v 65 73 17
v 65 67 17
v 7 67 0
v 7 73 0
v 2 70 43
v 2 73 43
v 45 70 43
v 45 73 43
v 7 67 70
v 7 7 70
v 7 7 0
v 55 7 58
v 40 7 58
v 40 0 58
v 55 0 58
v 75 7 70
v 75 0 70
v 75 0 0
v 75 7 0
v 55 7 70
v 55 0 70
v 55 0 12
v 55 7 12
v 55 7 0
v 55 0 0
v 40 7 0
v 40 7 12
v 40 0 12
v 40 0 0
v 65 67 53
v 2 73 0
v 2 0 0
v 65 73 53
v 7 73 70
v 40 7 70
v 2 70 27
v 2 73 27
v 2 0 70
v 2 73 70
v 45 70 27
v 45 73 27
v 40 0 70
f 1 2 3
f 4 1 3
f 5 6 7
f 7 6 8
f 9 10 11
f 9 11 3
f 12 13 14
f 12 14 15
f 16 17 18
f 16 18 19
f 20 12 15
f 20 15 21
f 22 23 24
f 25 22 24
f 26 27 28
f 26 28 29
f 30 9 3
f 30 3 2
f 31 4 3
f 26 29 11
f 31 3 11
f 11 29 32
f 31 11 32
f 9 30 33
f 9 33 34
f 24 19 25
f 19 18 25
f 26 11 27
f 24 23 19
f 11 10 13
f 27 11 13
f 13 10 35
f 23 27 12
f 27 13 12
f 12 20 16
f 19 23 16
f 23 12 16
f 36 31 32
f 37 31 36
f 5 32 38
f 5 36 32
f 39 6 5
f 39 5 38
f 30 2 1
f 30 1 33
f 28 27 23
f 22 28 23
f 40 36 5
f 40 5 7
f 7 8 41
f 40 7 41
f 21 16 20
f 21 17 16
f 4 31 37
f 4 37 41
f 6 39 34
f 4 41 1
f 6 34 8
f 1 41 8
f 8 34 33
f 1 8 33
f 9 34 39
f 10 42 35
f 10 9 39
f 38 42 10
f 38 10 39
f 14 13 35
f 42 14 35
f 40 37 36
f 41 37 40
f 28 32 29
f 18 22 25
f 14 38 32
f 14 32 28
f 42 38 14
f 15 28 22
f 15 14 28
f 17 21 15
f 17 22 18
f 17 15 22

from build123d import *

# Parameters (mm, degrees)
SKETCH_1_W          = 7
SKETCH_1_H          = 60
SKETCH_1_W_2        = 75
SKETCH_1_H_2        = 7
EXTRUDE_1_DEPTH     = 35
EXTRUDE_2_DEPTH     = 6
SKETCH_3_W          = 45
SKETCH_3_H          = 8
CUT_EXTRUDE_1_DEPTH = 3
SKETCH_4_W          = 15
SKETCH_4_H          = 12
CUT_EXTRUDE_2_DEPTH = 106.858395983
CUT_EXTRUDE_3_DEPTH = 2


with BuildPart() as part:
    # Эскиз1 → Бобышка-Вытянуть1 (new body)
    with BuildSketch(Plane.XY):
        with Locations((3.5, 37)):
            Rectangle(SKETCH_1_W, SKETCH_1_H)
        with Locations((37.5, 3.5)):
            Rectangle(SKETCH_1_W_2, SKETCH_1_H_2)
    extrude_1 = extrude(amount=EXTRUDE_1_DEPTH)

    # Эскиз2 → Бобышка-Вытянуть2 (add)
    with BuildSketch(Plane(origin=(0, 67, 0), x_dir=(1, 0, 0), z_dir=(0, 1, 0))):
        Polygon((0, -35), (65, -35), (65, -17), (7, 0), (0, 0), align=None)
    extrude_2 = extrude(amount=EXTRUDE_2_DEPTH)

    # Эскиз3 → Вырез-Вытянуть1 (cut)
    with BuildSketch(Plane(origin=(0, 73, 0), x_dir=(1, 0, 0), z_dir=(0, 1, 0))):
        with Locations((22.5, -31)):
            Rectangle(SKETCH_3_W, SKETCH_3_H)
    cut_extrude_1 = extrude(amount=-CUT_EXTRUDE_1_DEPTH, mode=Mode.SUBTRACT)

    # Эскиз4 → Вырез-Вытянуть2 (cut, through all)
    with BuildSketch(Plane(origin=(0, 7, 0), x_dir=(1, 0, 0), z_dir=(0, 1, 0))):
        with Locations((47.5, -6)):
            Rectangle(SKETCH_4_W, SKETCH_4_H)
    cut_extrude_2 = extrude(amount=-CUT_EXTRUDE_2_DEPTH, mode=Mode.SUBTRACT)

    # Зеркальное отражение1: Бобышка-Вытянуть1, Бобышка-Вытянуть2, Вырез-Вытянуть1, Вырез-Вытянуть2 across plane
    add(extrude_1.mirror(Plane.XY.offset(35)))
    add(extrude_2.mirror(Plane.XY.offset(35)))
    add(cut_extrude_1.mirror(Plane.XY.offset(35)), mode=Mode.SUBTRACT)
    add(cut_extrude_2.mirror(Plane.XY.offset(35)), mode=Mode.SUBTRACT)

    # Эскиз5 → Вырез-Вытянуть3 (cut)
    with BuildSketch(Plane.ZY):
        Polygon((70, 73), (43, 73), (43, 70), (27, 70), (27, 73), (0, 73), (0, 0), (70, 0), align=None)
    extrude(amount=-CUT_EXTRUDE_3_DEPTH, mode=Mode.SUBTRACT)


solid = part.part
